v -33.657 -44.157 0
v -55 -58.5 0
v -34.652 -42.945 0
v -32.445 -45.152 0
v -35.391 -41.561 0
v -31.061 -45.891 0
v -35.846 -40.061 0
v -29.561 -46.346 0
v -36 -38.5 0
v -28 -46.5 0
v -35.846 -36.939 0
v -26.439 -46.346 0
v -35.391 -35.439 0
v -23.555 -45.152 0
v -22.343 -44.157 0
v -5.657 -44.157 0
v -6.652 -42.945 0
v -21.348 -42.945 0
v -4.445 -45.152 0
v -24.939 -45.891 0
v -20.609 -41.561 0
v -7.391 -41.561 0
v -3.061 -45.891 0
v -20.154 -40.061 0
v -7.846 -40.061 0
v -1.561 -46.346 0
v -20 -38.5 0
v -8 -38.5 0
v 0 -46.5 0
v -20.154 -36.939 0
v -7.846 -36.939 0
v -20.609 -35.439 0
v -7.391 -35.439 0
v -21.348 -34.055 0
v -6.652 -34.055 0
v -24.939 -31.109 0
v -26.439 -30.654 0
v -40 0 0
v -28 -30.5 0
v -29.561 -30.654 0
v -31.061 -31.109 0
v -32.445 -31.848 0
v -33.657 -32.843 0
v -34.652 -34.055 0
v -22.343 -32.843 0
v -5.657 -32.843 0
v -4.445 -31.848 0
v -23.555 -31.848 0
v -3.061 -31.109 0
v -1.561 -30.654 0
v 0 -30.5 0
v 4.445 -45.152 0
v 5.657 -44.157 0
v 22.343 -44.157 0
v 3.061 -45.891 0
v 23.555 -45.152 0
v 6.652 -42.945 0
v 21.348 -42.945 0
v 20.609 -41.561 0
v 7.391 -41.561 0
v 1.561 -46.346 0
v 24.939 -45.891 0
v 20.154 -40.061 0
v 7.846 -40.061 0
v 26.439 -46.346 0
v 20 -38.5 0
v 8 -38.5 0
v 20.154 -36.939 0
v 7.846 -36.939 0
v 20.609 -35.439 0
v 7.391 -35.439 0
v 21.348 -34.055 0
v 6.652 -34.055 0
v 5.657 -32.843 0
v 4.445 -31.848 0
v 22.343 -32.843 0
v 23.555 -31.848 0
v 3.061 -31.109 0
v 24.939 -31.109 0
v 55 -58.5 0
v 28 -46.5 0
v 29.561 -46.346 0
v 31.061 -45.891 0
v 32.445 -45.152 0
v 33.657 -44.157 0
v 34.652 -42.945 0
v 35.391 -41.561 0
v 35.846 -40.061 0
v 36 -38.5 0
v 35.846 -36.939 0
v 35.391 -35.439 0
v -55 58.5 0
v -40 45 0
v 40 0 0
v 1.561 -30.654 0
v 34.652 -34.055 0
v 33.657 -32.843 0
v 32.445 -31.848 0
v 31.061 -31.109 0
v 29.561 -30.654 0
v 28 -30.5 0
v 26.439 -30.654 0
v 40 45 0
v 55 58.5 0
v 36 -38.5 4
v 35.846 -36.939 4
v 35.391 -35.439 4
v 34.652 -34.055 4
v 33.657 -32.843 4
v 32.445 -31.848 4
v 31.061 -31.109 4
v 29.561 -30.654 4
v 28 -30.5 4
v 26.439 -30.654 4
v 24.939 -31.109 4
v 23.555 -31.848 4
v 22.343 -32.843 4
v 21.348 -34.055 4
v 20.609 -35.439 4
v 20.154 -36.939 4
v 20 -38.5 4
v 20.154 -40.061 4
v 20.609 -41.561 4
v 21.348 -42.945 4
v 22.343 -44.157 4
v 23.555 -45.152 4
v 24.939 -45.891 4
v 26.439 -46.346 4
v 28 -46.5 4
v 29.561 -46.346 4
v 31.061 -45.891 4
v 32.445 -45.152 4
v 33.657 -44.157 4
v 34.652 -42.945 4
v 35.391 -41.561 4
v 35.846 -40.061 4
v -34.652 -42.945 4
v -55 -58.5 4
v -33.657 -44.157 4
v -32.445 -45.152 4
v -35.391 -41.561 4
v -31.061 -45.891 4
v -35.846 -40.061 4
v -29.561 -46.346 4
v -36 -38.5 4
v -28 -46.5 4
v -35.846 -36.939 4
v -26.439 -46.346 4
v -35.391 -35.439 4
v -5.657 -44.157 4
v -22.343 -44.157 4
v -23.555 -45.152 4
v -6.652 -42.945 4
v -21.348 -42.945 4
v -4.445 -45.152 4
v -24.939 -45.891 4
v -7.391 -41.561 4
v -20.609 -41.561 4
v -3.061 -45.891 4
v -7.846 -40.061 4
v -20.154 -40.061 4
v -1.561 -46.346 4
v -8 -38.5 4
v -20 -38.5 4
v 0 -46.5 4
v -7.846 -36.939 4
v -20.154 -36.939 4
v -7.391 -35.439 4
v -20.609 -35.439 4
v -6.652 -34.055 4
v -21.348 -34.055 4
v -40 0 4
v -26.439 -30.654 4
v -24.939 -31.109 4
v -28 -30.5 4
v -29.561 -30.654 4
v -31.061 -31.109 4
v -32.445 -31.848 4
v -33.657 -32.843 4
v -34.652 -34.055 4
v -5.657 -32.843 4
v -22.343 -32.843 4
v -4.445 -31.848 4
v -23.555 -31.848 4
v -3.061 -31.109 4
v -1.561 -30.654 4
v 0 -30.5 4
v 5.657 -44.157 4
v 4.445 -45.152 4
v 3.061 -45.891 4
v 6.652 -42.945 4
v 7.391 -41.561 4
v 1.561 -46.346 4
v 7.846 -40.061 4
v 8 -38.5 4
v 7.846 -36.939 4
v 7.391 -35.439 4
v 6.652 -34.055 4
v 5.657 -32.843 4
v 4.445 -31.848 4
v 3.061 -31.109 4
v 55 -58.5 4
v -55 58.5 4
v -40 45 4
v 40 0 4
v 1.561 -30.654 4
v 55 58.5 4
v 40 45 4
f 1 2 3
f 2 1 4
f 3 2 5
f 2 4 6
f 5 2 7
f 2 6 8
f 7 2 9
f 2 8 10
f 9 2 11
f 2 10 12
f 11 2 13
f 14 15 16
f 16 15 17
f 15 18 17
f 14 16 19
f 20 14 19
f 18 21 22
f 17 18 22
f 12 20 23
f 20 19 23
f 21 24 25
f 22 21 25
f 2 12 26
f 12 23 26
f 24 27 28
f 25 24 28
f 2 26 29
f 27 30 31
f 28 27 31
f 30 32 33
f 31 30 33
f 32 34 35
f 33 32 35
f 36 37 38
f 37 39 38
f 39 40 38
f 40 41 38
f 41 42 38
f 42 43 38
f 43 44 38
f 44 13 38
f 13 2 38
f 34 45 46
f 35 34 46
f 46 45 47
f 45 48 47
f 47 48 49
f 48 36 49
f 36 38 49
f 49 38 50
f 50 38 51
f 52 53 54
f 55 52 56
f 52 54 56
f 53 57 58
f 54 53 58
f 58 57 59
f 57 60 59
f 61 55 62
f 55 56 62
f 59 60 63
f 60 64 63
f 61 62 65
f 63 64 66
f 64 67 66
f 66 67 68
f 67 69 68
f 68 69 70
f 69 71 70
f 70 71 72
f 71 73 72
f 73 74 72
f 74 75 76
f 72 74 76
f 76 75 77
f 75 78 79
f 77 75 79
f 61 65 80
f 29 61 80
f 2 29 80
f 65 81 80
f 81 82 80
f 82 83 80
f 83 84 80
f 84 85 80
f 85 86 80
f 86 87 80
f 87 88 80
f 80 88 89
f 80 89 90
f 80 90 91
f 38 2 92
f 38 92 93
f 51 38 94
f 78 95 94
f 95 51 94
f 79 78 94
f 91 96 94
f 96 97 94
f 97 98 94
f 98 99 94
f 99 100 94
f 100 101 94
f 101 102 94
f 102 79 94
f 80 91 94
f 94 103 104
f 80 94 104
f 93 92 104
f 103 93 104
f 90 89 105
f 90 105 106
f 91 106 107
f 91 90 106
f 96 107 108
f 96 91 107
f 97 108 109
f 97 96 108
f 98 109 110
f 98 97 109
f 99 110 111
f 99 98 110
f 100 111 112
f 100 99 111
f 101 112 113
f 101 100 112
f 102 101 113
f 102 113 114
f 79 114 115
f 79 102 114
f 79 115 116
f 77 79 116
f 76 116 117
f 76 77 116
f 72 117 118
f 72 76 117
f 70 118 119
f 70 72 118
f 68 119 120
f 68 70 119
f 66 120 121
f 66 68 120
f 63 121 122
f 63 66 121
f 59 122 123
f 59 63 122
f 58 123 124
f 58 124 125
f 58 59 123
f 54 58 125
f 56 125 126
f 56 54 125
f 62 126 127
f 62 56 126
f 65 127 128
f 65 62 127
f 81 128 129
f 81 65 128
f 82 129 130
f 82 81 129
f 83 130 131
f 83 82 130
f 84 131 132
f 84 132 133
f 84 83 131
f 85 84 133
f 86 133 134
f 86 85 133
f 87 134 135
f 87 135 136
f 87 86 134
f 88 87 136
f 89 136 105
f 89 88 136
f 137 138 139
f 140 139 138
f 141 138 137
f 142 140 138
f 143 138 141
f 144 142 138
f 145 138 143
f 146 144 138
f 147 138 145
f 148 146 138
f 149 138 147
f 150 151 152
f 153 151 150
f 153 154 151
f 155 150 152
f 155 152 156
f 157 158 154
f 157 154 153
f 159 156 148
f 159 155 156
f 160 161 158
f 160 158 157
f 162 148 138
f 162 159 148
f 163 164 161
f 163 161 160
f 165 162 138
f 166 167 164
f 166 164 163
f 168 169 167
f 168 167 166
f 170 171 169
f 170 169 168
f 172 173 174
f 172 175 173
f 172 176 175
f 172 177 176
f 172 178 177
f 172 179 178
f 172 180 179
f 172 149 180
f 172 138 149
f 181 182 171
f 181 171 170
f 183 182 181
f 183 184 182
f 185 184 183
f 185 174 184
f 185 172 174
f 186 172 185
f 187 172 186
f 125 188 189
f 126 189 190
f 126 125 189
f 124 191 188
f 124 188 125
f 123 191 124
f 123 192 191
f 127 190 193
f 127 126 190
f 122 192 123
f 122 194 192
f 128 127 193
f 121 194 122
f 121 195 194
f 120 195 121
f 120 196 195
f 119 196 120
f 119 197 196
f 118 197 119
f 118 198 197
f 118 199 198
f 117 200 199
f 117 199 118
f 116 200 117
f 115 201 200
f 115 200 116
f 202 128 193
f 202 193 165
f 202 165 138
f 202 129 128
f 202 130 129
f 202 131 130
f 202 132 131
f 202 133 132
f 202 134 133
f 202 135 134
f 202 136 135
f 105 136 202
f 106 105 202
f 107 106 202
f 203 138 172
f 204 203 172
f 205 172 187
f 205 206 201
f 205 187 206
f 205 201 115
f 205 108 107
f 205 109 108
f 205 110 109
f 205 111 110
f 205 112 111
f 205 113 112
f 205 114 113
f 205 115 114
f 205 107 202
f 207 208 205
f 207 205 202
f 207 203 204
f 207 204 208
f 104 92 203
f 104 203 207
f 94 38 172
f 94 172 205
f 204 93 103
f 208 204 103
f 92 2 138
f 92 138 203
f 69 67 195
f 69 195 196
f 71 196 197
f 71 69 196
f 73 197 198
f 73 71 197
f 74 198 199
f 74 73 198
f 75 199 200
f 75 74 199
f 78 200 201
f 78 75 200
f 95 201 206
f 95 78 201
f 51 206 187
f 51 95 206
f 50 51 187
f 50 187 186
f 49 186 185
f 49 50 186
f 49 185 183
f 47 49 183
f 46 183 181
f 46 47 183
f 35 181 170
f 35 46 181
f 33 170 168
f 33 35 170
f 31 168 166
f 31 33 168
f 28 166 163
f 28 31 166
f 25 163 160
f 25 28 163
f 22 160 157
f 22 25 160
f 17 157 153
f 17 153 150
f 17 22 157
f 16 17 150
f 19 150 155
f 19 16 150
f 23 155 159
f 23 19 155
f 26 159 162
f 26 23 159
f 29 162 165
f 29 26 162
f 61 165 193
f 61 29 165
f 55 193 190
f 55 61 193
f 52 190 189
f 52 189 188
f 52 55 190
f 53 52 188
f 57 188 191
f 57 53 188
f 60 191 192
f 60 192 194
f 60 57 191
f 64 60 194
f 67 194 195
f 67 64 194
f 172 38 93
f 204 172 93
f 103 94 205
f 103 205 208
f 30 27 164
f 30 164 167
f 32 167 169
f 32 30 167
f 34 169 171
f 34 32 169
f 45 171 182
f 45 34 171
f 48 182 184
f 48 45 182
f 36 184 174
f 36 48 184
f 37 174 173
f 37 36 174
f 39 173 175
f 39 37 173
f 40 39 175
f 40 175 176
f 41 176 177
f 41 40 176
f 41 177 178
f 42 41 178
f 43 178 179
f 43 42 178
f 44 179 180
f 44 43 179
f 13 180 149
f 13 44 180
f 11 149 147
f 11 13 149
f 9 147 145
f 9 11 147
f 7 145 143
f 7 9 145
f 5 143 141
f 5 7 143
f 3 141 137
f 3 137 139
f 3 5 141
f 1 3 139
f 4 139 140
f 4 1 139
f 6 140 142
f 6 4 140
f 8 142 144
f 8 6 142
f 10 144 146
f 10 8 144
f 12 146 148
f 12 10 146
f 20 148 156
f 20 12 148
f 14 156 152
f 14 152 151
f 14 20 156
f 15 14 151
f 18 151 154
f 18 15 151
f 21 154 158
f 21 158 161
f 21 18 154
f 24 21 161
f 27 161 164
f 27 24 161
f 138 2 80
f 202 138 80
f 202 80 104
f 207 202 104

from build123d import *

# Parameters (mm, degrees)
SKETCH_W   = 110
SKETCH_H   = 117
SKETCH_R   = 8
SKETCH_W_2 = 80
SKETCH_H_2 = 45
PAD_DEPTH  = 4


with BuildPart() as part:
    # Sketch → Pad (new body)
    with BuildSketch(Plane.XY):
        Rectangle(SKETCH_W, SKETCH_H)
        with Locations((0, -38.5)):
            Circle(SKETCH_R, mode=Mode.SUBTRACT)
        with Locations((-28, -38.5)):
            Circle(SKETCH_R, mode=Mode.SUBTRACT)
        with Locations((28, -38.5)):
            Circle(SKETCH_R, mode=Mode.SUBTRACT)
        with Locations((0, 22.5)):
            Rectangle(SKETCH_W_2, SKETCH_H_2, mode=Mode.SUBTRACT)
    extrude(amount=PAD_DEPTH)


solid = part.part
